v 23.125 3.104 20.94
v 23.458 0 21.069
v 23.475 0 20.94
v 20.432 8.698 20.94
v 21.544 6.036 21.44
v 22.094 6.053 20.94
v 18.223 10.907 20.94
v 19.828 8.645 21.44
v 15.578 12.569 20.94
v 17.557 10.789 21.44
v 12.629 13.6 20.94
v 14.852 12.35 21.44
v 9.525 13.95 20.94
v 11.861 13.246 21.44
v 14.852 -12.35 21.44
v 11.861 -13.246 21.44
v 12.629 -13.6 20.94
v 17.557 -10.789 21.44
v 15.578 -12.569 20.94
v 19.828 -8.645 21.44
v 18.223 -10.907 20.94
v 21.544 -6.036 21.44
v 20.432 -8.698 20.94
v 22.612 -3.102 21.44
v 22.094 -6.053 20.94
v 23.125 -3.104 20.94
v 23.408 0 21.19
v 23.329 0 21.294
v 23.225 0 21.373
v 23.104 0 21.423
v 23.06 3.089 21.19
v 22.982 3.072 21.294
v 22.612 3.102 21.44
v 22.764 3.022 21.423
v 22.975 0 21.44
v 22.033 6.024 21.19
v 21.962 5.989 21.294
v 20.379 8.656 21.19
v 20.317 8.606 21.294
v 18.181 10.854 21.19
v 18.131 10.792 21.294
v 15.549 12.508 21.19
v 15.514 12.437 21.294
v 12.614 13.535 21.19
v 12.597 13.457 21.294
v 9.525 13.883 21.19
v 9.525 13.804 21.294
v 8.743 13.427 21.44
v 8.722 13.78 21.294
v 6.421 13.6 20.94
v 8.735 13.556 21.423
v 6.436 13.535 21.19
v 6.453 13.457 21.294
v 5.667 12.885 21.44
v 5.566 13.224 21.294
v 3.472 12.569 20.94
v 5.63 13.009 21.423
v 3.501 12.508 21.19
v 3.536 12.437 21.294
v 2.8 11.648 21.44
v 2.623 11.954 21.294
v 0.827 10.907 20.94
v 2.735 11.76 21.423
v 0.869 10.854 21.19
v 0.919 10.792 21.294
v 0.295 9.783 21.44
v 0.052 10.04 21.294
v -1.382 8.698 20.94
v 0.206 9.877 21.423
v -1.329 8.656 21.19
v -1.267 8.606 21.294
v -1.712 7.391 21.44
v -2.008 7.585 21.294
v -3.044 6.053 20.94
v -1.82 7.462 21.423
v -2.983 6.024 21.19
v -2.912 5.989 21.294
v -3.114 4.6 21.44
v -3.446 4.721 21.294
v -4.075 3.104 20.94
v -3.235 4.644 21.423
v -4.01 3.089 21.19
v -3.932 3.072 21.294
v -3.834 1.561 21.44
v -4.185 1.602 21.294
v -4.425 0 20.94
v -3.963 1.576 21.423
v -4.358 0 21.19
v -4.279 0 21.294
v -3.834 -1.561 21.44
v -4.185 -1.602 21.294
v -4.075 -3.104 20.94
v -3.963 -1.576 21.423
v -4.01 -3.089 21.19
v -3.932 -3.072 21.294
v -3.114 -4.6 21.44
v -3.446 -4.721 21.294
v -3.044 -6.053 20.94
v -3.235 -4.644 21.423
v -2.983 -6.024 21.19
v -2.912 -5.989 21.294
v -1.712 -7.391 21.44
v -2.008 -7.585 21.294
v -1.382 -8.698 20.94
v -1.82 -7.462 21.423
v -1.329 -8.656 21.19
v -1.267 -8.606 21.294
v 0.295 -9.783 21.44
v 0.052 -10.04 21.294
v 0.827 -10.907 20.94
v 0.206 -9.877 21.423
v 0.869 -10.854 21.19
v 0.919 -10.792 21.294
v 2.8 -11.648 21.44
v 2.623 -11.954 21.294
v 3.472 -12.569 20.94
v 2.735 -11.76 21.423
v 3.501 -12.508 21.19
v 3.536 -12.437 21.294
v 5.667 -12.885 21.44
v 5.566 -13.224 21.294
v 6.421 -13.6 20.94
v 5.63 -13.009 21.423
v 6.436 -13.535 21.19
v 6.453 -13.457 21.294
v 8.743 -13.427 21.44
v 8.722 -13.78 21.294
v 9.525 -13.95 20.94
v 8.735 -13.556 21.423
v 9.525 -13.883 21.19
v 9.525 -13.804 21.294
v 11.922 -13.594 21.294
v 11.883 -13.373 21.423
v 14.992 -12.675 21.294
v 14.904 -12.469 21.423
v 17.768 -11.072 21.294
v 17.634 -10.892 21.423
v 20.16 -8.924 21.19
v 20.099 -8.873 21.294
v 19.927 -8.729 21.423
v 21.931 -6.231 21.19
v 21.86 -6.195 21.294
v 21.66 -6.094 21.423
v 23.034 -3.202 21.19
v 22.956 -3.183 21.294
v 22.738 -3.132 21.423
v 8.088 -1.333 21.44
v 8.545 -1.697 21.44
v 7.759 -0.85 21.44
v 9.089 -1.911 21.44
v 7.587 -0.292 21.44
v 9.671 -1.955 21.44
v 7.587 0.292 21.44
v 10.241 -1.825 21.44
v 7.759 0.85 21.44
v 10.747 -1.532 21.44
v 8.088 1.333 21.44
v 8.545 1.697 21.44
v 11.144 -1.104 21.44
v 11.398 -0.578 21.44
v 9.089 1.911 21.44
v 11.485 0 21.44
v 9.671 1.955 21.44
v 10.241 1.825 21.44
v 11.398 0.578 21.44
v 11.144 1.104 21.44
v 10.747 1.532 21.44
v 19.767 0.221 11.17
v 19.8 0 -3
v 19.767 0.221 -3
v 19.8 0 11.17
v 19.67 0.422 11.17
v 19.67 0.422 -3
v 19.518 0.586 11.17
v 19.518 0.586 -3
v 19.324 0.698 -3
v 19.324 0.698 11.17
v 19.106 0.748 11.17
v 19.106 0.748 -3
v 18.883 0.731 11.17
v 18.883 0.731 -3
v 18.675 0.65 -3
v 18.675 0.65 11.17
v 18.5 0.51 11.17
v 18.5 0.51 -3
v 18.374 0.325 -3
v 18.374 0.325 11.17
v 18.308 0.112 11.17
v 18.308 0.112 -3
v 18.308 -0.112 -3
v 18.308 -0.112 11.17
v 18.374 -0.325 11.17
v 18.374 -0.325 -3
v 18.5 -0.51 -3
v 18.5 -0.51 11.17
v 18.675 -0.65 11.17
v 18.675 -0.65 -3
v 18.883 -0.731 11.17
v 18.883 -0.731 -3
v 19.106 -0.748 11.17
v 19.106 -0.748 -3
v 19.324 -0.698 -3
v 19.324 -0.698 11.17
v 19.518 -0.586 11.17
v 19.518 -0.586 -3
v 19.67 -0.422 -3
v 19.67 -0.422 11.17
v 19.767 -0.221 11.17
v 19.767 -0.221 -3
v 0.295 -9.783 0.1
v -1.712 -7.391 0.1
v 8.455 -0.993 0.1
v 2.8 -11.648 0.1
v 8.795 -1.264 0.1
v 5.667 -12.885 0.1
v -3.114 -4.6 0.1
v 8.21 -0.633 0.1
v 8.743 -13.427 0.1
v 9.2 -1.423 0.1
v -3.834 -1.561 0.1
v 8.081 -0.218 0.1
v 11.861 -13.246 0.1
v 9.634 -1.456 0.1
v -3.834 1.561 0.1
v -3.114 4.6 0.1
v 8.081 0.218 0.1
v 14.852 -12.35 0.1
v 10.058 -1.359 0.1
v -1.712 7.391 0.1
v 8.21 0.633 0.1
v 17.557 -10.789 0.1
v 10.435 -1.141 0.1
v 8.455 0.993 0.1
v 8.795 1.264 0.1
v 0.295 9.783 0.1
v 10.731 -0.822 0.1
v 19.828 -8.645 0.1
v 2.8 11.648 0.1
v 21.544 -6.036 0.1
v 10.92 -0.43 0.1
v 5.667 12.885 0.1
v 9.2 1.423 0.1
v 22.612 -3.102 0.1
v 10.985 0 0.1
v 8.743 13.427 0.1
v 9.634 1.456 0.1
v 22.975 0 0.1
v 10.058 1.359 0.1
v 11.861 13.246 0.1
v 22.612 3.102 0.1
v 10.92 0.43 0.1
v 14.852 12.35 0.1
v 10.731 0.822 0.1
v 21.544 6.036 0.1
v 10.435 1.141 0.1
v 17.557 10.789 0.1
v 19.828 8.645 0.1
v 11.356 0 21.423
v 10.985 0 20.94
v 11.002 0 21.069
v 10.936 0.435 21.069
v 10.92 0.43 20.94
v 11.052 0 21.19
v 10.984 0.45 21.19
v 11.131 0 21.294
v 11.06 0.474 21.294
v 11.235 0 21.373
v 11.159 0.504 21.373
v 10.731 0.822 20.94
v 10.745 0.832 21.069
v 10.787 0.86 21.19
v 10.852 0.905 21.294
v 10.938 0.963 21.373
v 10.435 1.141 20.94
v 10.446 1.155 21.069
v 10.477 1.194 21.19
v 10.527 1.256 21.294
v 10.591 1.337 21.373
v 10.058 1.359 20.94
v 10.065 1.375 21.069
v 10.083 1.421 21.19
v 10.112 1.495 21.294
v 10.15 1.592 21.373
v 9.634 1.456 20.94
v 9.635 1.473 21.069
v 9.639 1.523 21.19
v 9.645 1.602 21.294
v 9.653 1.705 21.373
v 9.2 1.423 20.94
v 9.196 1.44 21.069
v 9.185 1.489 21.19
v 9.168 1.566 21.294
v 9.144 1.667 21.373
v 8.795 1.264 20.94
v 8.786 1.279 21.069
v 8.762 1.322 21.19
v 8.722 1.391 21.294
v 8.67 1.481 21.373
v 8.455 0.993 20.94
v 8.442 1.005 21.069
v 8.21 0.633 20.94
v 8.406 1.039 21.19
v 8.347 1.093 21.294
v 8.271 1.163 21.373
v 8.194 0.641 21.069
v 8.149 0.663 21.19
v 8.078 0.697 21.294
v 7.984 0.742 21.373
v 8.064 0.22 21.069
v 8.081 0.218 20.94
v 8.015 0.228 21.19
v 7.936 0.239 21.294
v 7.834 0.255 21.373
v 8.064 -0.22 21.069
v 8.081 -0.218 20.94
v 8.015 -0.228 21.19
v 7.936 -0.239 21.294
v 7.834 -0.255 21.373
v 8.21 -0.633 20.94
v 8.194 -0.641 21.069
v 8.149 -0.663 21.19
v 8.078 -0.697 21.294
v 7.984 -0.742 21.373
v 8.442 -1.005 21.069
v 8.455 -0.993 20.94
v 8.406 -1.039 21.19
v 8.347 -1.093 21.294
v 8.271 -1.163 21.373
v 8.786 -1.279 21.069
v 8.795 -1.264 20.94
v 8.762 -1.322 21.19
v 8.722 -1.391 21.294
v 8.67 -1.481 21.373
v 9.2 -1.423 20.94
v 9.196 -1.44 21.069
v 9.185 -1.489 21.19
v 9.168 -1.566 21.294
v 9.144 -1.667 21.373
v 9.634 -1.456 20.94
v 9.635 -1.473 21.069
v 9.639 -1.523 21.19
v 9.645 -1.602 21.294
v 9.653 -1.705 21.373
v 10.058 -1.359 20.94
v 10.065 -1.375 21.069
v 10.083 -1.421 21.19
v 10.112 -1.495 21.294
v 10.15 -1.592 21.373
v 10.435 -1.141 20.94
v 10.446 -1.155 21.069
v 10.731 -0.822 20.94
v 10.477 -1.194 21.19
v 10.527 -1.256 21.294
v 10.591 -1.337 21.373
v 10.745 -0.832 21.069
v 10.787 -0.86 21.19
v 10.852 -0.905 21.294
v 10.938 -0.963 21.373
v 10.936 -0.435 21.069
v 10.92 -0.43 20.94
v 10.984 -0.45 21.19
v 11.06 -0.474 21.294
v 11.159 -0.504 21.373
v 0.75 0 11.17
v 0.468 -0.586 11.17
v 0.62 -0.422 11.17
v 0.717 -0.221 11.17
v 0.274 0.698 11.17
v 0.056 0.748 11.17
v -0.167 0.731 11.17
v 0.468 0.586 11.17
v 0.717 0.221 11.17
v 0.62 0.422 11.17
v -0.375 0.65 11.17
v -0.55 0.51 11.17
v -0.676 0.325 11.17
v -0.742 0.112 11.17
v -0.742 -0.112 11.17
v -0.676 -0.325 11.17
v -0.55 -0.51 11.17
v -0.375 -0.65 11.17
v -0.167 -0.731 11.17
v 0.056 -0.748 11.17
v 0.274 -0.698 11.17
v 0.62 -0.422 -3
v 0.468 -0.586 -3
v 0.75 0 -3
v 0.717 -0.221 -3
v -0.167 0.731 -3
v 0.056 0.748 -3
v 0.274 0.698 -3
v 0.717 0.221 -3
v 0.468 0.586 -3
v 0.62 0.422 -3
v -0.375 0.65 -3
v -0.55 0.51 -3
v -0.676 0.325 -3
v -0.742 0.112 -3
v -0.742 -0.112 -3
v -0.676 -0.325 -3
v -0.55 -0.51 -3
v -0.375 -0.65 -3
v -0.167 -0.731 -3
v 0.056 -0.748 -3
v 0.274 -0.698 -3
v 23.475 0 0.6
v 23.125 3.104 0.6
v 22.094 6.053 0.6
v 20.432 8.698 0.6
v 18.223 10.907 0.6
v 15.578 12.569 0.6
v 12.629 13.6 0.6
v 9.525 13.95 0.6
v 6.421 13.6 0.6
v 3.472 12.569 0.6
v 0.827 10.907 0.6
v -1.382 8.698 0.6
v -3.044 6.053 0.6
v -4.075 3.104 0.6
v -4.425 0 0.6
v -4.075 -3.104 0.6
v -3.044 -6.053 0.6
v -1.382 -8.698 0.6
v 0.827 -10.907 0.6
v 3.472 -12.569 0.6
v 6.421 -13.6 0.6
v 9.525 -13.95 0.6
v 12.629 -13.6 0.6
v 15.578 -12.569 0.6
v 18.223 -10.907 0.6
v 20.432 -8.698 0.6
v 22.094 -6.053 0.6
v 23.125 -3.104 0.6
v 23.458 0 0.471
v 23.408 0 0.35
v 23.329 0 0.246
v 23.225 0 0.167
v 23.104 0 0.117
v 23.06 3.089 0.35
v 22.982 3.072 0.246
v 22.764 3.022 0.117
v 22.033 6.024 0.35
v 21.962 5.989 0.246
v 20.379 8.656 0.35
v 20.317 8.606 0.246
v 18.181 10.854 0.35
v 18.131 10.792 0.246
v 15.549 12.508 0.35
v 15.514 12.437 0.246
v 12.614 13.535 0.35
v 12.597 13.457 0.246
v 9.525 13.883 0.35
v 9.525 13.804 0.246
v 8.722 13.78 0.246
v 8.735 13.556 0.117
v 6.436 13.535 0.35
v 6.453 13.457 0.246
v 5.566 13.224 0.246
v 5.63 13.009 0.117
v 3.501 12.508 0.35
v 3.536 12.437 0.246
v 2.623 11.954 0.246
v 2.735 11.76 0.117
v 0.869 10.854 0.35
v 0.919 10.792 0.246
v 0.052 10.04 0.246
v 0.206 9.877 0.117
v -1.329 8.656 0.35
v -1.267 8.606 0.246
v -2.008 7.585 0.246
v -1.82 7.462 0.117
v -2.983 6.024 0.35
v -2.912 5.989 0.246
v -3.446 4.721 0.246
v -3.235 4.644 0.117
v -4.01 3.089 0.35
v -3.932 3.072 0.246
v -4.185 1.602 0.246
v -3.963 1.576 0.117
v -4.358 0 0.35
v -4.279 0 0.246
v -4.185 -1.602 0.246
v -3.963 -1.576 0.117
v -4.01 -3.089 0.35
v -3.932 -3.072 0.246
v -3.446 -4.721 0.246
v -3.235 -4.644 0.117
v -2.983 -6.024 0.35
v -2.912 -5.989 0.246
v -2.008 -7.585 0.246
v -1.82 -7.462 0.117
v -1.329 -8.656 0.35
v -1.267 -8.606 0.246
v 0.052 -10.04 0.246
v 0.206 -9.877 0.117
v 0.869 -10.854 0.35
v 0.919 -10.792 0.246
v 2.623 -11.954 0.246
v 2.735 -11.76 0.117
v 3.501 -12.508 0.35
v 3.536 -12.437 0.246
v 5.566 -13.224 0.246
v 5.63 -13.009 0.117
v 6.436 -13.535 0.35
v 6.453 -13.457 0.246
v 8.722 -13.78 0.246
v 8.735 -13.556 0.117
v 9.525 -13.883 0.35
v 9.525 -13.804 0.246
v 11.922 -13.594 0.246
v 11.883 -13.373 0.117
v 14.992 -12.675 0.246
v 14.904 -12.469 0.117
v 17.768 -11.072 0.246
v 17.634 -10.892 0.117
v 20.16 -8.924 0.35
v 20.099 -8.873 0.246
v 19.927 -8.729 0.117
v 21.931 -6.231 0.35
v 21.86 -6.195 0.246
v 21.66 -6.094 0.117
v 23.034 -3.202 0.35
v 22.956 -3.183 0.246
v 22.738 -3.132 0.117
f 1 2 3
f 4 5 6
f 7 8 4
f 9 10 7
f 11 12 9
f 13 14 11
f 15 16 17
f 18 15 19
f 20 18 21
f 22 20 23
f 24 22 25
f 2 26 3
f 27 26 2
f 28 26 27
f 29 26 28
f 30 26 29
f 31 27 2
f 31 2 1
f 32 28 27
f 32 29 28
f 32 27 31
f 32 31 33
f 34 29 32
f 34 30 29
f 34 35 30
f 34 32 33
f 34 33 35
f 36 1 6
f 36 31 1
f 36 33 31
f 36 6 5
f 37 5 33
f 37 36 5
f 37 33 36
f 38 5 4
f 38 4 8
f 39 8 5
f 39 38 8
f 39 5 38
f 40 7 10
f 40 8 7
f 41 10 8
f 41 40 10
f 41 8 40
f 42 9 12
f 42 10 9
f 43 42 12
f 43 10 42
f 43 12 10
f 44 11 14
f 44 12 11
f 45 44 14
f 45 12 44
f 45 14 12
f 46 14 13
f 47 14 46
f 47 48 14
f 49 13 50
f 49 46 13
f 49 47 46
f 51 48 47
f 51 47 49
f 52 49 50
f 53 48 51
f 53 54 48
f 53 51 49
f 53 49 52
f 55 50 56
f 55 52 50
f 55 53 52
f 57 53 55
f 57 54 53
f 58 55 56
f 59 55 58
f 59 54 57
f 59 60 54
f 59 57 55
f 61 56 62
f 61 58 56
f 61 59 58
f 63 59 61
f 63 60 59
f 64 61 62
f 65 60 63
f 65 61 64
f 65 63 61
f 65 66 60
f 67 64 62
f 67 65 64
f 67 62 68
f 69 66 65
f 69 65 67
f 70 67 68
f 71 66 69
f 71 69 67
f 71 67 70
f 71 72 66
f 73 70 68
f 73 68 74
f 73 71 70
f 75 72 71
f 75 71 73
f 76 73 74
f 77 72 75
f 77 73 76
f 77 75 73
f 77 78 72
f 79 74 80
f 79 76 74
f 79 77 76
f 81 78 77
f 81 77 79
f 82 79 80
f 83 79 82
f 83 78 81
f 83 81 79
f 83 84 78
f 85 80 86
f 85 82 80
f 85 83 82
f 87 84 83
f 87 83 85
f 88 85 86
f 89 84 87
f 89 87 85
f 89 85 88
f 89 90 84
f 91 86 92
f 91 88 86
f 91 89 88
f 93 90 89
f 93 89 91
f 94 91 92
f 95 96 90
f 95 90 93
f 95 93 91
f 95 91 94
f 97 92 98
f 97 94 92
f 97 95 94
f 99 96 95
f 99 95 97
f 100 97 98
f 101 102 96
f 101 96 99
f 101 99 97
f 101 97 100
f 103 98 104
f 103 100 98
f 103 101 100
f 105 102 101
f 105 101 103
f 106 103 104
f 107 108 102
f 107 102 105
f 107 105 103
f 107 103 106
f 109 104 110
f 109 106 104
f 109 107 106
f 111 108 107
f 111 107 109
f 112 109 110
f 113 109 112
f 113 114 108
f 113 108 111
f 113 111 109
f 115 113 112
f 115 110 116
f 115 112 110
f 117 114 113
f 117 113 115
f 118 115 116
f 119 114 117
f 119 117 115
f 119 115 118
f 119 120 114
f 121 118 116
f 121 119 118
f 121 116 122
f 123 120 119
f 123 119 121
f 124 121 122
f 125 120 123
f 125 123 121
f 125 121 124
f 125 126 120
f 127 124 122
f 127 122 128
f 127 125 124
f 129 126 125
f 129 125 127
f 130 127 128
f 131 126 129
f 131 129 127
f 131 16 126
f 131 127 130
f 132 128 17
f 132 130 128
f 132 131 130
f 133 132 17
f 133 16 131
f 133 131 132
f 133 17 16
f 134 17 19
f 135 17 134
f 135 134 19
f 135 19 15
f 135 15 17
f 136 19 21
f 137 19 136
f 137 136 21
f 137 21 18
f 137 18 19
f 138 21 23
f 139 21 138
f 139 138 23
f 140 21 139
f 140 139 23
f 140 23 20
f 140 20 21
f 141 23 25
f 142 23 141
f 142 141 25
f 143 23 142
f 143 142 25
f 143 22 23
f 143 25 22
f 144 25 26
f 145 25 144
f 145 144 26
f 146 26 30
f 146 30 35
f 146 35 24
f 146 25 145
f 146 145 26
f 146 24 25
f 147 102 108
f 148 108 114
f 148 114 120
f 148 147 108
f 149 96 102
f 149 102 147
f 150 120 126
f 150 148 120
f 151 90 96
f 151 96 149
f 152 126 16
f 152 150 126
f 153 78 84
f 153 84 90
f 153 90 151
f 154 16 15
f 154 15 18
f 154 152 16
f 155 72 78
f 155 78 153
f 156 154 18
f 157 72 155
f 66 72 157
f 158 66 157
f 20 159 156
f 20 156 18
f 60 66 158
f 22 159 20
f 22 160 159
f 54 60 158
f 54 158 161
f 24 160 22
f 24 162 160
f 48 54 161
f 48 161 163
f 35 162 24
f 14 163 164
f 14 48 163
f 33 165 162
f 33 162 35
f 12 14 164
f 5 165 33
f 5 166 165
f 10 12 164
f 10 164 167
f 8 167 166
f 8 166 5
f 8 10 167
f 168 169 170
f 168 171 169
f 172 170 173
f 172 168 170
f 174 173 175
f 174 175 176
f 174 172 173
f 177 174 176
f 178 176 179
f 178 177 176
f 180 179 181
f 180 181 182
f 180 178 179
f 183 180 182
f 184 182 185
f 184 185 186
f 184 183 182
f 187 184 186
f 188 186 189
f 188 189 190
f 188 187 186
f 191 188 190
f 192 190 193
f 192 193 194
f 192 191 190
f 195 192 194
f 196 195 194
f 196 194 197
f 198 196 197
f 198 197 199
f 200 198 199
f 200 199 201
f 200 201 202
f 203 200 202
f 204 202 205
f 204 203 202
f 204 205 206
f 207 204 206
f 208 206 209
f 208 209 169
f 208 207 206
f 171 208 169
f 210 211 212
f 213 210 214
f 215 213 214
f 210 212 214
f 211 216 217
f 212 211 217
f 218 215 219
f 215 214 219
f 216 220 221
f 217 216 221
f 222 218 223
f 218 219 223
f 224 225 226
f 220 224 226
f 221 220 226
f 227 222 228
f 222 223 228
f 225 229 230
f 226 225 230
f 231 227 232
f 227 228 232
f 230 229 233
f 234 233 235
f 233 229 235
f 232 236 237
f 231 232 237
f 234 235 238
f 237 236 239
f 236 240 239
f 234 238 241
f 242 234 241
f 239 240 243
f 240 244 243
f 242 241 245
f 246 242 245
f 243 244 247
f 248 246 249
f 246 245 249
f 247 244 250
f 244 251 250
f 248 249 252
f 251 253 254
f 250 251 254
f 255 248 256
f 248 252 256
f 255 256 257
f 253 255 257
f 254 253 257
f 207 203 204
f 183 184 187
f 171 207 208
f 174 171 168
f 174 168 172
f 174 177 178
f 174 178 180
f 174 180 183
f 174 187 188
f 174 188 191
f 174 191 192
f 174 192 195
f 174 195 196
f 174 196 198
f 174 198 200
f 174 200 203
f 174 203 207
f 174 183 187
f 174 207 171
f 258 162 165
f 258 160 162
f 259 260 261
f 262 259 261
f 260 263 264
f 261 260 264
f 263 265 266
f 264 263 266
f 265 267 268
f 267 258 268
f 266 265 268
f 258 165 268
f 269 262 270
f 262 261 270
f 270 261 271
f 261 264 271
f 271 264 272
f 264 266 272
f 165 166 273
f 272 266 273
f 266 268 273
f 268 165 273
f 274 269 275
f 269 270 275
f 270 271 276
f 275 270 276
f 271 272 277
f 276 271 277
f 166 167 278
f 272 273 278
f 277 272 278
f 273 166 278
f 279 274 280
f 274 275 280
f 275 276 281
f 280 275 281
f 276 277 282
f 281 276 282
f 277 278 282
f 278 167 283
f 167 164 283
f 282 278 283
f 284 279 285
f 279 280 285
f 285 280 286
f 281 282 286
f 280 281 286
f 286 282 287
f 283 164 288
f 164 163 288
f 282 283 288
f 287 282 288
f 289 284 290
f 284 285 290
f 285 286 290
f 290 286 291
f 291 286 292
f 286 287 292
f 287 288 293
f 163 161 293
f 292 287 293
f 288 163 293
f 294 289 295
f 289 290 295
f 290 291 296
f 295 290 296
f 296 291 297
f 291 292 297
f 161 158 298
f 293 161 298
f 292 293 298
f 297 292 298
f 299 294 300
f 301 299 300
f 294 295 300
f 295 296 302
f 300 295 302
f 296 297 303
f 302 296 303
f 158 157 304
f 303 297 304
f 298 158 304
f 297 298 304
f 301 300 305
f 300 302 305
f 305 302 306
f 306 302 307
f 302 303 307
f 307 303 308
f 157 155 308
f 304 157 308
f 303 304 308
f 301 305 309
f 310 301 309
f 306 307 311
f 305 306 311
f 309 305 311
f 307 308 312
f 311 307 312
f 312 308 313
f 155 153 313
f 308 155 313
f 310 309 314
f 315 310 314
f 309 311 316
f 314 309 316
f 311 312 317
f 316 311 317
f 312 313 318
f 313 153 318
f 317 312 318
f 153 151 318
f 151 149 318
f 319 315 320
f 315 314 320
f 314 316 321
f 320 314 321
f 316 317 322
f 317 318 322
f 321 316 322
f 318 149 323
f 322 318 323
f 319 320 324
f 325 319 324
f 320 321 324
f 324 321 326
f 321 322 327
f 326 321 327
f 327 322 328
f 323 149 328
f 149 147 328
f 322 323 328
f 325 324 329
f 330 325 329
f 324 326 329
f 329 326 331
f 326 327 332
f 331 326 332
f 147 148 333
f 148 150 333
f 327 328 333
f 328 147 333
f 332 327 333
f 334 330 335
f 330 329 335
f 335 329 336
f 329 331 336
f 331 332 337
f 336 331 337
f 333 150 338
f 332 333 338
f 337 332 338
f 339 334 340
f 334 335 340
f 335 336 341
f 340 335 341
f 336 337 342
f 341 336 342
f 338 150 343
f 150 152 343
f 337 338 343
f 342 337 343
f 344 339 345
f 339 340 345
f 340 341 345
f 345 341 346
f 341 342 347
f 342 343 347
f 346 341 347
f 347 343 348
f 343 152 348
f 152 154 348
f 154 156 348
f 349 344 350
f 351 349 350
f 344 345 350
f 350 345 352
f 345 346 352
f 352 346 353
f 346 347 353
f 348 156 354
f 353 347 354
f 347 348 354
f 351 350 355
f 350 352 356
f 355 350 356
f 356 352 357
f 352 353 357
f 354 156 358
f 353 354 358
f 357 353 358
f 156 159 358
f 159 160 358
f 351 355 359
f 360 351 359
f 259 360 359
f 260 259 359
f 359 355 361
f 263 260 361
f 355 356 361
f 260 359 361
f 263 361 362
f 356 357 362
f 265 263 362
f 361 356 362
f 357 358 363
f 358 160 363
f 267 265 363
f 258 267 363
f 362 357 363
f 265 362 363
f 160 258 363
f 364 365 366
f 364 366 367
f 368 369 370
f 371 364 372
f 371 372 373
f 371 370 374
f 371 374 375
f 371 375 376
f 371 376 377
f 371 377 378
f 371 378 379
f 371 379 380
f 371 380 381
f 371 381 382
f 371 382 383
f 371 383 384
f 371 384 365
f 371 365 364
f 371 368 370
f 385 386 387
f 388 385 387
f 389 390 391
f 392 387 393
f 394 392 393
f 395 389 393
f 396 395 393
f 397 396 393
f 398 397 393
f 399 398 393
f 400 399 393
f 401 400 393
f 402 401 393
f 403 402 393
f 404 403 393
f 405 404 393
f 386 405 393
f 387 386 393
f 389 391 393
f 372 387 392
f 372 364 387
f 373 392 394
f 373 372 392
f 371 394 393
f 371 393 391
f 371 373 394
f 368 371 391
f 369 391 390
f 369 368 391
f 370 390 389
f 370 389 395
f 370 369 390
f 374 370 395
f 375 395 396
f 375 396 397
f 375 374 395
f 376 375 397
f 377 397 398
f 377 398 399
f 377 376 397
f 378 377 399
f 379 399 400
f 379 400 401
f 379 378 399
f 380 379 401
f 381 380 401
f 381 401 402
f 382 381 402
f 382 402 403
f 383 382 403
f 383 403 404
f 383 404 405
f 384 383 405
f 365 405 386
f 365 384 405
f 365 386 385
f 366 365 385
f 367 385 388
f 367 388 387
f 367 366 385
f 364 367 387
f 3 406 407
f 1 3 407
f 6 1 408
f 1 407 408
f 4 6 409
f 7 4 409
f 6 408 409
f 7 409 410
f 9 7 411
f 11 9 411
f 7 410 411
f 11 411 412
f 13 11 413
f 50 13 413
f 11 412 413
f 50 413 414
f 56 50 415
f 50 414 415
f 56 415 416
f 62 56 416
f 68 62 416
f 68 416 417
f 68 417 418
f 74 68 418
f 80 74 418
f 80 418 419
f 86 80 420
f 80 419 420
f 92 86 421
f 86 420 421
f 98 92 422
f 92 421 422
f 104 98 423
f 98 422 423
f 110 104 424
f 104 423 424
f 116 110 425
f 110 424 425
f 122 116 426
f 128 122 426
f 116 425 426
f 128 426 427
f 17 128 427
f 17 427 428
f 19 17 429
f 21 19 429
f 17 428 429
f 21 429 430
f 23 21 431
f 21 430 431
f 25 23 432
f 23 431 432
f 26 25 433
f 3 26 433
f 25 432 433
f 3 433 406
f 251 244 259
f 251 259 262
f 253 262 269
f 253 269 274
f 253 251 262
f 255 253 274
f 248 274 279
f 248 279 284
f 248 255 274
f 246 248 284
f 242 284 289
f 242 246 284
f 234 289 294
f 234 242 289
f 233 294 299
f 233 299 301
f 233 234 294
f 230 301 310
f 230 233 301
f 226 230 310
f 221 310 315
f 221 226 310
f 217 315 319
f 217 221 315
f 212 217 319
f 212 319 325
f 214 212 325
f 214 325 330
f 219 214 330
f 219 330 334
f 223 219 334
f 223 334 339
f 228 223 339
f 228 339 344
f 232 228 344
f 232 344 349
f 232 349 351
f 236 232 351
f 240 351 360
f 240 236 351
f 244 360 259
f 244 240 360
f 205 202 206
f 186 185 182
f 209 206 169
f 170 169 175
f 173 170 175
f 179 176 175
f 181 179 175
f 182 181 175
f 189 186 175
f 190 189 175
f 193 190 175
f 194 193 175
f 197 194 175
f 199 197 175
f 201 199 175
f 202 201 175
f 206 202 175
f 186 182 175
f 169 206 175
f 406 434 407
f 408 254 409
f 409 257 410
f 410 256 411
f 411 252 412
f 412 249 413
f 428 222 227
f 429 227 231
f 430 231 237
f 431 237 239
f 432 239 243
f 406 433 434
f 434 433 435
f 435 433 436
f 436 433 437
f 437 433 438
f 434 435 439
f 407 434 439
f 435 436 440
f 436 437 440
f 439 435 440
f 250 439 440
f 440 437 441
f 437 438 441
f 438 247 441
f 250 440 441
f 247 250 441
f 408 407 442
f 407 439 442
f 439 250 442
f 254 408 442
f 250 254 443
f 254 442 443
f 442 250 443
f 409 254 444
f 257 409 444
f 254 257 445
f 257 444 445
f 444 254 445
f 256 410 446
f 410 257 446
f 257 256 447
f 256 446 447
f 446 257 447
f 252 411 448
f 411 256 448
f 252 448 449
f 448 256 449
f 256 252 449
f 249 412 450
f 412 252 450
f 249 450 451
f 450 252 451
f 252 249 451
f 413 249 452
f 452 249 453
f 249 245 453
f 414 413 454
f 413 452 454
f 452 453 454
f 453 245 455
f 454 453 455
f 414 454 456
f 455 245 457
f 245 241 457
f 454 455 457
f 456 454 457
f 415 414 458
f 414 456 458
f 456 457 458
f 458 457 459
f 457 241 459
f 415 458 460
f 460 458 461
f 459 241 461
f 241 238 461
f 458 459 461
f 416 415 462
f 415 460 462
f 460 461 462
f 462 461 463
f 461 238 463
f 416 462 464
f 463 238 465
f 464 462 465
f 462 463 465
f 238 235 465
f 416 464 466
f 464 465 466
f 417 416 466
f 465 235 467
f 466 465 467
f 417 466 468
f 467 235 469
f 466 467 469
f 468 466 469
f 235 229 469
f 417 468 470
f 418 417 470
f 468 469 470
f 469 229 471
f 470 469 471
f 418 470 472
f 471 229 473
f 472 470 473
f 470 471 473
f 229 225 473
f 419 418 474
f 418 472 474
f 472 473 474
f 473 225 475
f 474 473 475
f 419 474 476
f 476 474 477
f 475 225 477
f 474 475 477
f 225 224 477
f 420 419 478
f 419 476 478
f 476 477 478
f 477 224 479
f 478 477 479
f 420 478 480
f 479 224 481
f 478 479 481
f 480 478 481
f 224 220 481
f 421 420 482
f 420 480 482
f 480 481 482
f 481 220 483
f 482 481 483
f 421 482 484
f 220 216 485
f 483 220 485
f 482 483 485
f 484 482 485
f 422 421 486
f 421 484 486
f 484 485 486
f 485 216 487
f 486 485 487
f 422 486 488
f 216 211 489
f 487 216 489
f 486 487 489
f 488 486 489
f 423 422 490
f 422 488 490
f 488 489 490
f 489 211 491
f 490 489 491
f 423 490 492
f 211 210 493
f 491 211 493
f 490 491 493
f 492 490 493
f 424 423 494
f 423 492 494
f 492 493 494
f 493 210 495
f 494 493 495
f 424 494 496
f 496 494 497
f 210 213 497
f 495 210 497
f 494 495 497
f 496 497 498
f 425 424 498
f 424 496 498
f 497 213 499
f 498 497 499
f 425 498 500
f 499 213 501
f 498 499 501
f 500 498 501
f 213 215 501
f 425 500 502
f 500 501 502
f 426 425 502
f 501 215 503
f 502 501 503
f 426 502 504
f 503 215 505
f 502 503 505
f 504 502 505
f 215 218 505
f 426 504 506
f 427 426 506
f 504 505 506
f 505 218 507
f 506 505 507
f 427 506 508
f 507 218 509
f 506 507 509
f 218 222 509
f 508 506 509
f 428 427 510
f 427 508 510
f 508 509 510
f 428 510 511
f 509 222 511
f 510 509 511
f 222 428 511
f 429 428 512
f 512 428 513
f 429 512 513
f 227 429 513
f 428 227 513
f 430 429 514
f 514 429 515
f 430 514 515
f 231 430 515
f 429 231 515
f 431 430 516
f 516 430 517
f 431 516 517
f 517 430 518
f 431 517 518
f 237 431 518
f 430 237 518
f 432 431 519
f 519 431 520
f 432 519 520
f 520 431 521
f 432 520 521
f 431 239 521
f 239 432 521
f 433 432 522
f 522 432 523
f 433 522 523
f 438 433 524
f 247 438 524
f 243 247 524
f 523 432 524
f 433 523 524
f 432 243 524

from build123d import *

# Parameters (mm, degrees)
SKETCH001_R       = 0.75
PAD001_DEPTH      = 10.67
PAD001_DEPTH_BACK = 3.5
SKETCH_R          = 13.95
SKETCH_R_2        = 1.46
PAD_DEPTH         = 21.34
FILLET_R          = 0.5


with BuildPart() as pad001:
    # Sketch001 → Pad001 (new body, two sides)
    with BuildSketch(Plane.XY.offset(0.5)) as pad001_sk:
        Circle(SKETCH001_R)
        with Locations((19.05, 0)):
            Circle(SKETCH001_R)
    extrude(amount=PAD001_DEPTH)
    extrude(pad001_sk.sketch, amount=-PAD001_DEPTH_BACK)


with BuildPart() as fillet_body:
    # Sketch → Pad (new body)
    with BuildSketch(Plane.XY.offset(0.1)):
        with Locations((9.525, 0)):
            Circle(SKETCH_R)
        with Locations((9.525, 0)):
            Circle(SKETCH_R_2, mode=Mode.SUBTRACT)
    extrude(amount=PAD_DEPTH)

    # Fillet
    fillet_edges = [fillet_body.edges().sort_by_distance(p)[0] for p in [
        (8.065, 0, 21.44),
        (-4.425, 0, 21.44),
        (-4.425, 0, 0.1),
    ]]
    fillet(fillet_edges, radius=FILLET_R)


solid = Compound([pad001.part, fillet_body.part])
